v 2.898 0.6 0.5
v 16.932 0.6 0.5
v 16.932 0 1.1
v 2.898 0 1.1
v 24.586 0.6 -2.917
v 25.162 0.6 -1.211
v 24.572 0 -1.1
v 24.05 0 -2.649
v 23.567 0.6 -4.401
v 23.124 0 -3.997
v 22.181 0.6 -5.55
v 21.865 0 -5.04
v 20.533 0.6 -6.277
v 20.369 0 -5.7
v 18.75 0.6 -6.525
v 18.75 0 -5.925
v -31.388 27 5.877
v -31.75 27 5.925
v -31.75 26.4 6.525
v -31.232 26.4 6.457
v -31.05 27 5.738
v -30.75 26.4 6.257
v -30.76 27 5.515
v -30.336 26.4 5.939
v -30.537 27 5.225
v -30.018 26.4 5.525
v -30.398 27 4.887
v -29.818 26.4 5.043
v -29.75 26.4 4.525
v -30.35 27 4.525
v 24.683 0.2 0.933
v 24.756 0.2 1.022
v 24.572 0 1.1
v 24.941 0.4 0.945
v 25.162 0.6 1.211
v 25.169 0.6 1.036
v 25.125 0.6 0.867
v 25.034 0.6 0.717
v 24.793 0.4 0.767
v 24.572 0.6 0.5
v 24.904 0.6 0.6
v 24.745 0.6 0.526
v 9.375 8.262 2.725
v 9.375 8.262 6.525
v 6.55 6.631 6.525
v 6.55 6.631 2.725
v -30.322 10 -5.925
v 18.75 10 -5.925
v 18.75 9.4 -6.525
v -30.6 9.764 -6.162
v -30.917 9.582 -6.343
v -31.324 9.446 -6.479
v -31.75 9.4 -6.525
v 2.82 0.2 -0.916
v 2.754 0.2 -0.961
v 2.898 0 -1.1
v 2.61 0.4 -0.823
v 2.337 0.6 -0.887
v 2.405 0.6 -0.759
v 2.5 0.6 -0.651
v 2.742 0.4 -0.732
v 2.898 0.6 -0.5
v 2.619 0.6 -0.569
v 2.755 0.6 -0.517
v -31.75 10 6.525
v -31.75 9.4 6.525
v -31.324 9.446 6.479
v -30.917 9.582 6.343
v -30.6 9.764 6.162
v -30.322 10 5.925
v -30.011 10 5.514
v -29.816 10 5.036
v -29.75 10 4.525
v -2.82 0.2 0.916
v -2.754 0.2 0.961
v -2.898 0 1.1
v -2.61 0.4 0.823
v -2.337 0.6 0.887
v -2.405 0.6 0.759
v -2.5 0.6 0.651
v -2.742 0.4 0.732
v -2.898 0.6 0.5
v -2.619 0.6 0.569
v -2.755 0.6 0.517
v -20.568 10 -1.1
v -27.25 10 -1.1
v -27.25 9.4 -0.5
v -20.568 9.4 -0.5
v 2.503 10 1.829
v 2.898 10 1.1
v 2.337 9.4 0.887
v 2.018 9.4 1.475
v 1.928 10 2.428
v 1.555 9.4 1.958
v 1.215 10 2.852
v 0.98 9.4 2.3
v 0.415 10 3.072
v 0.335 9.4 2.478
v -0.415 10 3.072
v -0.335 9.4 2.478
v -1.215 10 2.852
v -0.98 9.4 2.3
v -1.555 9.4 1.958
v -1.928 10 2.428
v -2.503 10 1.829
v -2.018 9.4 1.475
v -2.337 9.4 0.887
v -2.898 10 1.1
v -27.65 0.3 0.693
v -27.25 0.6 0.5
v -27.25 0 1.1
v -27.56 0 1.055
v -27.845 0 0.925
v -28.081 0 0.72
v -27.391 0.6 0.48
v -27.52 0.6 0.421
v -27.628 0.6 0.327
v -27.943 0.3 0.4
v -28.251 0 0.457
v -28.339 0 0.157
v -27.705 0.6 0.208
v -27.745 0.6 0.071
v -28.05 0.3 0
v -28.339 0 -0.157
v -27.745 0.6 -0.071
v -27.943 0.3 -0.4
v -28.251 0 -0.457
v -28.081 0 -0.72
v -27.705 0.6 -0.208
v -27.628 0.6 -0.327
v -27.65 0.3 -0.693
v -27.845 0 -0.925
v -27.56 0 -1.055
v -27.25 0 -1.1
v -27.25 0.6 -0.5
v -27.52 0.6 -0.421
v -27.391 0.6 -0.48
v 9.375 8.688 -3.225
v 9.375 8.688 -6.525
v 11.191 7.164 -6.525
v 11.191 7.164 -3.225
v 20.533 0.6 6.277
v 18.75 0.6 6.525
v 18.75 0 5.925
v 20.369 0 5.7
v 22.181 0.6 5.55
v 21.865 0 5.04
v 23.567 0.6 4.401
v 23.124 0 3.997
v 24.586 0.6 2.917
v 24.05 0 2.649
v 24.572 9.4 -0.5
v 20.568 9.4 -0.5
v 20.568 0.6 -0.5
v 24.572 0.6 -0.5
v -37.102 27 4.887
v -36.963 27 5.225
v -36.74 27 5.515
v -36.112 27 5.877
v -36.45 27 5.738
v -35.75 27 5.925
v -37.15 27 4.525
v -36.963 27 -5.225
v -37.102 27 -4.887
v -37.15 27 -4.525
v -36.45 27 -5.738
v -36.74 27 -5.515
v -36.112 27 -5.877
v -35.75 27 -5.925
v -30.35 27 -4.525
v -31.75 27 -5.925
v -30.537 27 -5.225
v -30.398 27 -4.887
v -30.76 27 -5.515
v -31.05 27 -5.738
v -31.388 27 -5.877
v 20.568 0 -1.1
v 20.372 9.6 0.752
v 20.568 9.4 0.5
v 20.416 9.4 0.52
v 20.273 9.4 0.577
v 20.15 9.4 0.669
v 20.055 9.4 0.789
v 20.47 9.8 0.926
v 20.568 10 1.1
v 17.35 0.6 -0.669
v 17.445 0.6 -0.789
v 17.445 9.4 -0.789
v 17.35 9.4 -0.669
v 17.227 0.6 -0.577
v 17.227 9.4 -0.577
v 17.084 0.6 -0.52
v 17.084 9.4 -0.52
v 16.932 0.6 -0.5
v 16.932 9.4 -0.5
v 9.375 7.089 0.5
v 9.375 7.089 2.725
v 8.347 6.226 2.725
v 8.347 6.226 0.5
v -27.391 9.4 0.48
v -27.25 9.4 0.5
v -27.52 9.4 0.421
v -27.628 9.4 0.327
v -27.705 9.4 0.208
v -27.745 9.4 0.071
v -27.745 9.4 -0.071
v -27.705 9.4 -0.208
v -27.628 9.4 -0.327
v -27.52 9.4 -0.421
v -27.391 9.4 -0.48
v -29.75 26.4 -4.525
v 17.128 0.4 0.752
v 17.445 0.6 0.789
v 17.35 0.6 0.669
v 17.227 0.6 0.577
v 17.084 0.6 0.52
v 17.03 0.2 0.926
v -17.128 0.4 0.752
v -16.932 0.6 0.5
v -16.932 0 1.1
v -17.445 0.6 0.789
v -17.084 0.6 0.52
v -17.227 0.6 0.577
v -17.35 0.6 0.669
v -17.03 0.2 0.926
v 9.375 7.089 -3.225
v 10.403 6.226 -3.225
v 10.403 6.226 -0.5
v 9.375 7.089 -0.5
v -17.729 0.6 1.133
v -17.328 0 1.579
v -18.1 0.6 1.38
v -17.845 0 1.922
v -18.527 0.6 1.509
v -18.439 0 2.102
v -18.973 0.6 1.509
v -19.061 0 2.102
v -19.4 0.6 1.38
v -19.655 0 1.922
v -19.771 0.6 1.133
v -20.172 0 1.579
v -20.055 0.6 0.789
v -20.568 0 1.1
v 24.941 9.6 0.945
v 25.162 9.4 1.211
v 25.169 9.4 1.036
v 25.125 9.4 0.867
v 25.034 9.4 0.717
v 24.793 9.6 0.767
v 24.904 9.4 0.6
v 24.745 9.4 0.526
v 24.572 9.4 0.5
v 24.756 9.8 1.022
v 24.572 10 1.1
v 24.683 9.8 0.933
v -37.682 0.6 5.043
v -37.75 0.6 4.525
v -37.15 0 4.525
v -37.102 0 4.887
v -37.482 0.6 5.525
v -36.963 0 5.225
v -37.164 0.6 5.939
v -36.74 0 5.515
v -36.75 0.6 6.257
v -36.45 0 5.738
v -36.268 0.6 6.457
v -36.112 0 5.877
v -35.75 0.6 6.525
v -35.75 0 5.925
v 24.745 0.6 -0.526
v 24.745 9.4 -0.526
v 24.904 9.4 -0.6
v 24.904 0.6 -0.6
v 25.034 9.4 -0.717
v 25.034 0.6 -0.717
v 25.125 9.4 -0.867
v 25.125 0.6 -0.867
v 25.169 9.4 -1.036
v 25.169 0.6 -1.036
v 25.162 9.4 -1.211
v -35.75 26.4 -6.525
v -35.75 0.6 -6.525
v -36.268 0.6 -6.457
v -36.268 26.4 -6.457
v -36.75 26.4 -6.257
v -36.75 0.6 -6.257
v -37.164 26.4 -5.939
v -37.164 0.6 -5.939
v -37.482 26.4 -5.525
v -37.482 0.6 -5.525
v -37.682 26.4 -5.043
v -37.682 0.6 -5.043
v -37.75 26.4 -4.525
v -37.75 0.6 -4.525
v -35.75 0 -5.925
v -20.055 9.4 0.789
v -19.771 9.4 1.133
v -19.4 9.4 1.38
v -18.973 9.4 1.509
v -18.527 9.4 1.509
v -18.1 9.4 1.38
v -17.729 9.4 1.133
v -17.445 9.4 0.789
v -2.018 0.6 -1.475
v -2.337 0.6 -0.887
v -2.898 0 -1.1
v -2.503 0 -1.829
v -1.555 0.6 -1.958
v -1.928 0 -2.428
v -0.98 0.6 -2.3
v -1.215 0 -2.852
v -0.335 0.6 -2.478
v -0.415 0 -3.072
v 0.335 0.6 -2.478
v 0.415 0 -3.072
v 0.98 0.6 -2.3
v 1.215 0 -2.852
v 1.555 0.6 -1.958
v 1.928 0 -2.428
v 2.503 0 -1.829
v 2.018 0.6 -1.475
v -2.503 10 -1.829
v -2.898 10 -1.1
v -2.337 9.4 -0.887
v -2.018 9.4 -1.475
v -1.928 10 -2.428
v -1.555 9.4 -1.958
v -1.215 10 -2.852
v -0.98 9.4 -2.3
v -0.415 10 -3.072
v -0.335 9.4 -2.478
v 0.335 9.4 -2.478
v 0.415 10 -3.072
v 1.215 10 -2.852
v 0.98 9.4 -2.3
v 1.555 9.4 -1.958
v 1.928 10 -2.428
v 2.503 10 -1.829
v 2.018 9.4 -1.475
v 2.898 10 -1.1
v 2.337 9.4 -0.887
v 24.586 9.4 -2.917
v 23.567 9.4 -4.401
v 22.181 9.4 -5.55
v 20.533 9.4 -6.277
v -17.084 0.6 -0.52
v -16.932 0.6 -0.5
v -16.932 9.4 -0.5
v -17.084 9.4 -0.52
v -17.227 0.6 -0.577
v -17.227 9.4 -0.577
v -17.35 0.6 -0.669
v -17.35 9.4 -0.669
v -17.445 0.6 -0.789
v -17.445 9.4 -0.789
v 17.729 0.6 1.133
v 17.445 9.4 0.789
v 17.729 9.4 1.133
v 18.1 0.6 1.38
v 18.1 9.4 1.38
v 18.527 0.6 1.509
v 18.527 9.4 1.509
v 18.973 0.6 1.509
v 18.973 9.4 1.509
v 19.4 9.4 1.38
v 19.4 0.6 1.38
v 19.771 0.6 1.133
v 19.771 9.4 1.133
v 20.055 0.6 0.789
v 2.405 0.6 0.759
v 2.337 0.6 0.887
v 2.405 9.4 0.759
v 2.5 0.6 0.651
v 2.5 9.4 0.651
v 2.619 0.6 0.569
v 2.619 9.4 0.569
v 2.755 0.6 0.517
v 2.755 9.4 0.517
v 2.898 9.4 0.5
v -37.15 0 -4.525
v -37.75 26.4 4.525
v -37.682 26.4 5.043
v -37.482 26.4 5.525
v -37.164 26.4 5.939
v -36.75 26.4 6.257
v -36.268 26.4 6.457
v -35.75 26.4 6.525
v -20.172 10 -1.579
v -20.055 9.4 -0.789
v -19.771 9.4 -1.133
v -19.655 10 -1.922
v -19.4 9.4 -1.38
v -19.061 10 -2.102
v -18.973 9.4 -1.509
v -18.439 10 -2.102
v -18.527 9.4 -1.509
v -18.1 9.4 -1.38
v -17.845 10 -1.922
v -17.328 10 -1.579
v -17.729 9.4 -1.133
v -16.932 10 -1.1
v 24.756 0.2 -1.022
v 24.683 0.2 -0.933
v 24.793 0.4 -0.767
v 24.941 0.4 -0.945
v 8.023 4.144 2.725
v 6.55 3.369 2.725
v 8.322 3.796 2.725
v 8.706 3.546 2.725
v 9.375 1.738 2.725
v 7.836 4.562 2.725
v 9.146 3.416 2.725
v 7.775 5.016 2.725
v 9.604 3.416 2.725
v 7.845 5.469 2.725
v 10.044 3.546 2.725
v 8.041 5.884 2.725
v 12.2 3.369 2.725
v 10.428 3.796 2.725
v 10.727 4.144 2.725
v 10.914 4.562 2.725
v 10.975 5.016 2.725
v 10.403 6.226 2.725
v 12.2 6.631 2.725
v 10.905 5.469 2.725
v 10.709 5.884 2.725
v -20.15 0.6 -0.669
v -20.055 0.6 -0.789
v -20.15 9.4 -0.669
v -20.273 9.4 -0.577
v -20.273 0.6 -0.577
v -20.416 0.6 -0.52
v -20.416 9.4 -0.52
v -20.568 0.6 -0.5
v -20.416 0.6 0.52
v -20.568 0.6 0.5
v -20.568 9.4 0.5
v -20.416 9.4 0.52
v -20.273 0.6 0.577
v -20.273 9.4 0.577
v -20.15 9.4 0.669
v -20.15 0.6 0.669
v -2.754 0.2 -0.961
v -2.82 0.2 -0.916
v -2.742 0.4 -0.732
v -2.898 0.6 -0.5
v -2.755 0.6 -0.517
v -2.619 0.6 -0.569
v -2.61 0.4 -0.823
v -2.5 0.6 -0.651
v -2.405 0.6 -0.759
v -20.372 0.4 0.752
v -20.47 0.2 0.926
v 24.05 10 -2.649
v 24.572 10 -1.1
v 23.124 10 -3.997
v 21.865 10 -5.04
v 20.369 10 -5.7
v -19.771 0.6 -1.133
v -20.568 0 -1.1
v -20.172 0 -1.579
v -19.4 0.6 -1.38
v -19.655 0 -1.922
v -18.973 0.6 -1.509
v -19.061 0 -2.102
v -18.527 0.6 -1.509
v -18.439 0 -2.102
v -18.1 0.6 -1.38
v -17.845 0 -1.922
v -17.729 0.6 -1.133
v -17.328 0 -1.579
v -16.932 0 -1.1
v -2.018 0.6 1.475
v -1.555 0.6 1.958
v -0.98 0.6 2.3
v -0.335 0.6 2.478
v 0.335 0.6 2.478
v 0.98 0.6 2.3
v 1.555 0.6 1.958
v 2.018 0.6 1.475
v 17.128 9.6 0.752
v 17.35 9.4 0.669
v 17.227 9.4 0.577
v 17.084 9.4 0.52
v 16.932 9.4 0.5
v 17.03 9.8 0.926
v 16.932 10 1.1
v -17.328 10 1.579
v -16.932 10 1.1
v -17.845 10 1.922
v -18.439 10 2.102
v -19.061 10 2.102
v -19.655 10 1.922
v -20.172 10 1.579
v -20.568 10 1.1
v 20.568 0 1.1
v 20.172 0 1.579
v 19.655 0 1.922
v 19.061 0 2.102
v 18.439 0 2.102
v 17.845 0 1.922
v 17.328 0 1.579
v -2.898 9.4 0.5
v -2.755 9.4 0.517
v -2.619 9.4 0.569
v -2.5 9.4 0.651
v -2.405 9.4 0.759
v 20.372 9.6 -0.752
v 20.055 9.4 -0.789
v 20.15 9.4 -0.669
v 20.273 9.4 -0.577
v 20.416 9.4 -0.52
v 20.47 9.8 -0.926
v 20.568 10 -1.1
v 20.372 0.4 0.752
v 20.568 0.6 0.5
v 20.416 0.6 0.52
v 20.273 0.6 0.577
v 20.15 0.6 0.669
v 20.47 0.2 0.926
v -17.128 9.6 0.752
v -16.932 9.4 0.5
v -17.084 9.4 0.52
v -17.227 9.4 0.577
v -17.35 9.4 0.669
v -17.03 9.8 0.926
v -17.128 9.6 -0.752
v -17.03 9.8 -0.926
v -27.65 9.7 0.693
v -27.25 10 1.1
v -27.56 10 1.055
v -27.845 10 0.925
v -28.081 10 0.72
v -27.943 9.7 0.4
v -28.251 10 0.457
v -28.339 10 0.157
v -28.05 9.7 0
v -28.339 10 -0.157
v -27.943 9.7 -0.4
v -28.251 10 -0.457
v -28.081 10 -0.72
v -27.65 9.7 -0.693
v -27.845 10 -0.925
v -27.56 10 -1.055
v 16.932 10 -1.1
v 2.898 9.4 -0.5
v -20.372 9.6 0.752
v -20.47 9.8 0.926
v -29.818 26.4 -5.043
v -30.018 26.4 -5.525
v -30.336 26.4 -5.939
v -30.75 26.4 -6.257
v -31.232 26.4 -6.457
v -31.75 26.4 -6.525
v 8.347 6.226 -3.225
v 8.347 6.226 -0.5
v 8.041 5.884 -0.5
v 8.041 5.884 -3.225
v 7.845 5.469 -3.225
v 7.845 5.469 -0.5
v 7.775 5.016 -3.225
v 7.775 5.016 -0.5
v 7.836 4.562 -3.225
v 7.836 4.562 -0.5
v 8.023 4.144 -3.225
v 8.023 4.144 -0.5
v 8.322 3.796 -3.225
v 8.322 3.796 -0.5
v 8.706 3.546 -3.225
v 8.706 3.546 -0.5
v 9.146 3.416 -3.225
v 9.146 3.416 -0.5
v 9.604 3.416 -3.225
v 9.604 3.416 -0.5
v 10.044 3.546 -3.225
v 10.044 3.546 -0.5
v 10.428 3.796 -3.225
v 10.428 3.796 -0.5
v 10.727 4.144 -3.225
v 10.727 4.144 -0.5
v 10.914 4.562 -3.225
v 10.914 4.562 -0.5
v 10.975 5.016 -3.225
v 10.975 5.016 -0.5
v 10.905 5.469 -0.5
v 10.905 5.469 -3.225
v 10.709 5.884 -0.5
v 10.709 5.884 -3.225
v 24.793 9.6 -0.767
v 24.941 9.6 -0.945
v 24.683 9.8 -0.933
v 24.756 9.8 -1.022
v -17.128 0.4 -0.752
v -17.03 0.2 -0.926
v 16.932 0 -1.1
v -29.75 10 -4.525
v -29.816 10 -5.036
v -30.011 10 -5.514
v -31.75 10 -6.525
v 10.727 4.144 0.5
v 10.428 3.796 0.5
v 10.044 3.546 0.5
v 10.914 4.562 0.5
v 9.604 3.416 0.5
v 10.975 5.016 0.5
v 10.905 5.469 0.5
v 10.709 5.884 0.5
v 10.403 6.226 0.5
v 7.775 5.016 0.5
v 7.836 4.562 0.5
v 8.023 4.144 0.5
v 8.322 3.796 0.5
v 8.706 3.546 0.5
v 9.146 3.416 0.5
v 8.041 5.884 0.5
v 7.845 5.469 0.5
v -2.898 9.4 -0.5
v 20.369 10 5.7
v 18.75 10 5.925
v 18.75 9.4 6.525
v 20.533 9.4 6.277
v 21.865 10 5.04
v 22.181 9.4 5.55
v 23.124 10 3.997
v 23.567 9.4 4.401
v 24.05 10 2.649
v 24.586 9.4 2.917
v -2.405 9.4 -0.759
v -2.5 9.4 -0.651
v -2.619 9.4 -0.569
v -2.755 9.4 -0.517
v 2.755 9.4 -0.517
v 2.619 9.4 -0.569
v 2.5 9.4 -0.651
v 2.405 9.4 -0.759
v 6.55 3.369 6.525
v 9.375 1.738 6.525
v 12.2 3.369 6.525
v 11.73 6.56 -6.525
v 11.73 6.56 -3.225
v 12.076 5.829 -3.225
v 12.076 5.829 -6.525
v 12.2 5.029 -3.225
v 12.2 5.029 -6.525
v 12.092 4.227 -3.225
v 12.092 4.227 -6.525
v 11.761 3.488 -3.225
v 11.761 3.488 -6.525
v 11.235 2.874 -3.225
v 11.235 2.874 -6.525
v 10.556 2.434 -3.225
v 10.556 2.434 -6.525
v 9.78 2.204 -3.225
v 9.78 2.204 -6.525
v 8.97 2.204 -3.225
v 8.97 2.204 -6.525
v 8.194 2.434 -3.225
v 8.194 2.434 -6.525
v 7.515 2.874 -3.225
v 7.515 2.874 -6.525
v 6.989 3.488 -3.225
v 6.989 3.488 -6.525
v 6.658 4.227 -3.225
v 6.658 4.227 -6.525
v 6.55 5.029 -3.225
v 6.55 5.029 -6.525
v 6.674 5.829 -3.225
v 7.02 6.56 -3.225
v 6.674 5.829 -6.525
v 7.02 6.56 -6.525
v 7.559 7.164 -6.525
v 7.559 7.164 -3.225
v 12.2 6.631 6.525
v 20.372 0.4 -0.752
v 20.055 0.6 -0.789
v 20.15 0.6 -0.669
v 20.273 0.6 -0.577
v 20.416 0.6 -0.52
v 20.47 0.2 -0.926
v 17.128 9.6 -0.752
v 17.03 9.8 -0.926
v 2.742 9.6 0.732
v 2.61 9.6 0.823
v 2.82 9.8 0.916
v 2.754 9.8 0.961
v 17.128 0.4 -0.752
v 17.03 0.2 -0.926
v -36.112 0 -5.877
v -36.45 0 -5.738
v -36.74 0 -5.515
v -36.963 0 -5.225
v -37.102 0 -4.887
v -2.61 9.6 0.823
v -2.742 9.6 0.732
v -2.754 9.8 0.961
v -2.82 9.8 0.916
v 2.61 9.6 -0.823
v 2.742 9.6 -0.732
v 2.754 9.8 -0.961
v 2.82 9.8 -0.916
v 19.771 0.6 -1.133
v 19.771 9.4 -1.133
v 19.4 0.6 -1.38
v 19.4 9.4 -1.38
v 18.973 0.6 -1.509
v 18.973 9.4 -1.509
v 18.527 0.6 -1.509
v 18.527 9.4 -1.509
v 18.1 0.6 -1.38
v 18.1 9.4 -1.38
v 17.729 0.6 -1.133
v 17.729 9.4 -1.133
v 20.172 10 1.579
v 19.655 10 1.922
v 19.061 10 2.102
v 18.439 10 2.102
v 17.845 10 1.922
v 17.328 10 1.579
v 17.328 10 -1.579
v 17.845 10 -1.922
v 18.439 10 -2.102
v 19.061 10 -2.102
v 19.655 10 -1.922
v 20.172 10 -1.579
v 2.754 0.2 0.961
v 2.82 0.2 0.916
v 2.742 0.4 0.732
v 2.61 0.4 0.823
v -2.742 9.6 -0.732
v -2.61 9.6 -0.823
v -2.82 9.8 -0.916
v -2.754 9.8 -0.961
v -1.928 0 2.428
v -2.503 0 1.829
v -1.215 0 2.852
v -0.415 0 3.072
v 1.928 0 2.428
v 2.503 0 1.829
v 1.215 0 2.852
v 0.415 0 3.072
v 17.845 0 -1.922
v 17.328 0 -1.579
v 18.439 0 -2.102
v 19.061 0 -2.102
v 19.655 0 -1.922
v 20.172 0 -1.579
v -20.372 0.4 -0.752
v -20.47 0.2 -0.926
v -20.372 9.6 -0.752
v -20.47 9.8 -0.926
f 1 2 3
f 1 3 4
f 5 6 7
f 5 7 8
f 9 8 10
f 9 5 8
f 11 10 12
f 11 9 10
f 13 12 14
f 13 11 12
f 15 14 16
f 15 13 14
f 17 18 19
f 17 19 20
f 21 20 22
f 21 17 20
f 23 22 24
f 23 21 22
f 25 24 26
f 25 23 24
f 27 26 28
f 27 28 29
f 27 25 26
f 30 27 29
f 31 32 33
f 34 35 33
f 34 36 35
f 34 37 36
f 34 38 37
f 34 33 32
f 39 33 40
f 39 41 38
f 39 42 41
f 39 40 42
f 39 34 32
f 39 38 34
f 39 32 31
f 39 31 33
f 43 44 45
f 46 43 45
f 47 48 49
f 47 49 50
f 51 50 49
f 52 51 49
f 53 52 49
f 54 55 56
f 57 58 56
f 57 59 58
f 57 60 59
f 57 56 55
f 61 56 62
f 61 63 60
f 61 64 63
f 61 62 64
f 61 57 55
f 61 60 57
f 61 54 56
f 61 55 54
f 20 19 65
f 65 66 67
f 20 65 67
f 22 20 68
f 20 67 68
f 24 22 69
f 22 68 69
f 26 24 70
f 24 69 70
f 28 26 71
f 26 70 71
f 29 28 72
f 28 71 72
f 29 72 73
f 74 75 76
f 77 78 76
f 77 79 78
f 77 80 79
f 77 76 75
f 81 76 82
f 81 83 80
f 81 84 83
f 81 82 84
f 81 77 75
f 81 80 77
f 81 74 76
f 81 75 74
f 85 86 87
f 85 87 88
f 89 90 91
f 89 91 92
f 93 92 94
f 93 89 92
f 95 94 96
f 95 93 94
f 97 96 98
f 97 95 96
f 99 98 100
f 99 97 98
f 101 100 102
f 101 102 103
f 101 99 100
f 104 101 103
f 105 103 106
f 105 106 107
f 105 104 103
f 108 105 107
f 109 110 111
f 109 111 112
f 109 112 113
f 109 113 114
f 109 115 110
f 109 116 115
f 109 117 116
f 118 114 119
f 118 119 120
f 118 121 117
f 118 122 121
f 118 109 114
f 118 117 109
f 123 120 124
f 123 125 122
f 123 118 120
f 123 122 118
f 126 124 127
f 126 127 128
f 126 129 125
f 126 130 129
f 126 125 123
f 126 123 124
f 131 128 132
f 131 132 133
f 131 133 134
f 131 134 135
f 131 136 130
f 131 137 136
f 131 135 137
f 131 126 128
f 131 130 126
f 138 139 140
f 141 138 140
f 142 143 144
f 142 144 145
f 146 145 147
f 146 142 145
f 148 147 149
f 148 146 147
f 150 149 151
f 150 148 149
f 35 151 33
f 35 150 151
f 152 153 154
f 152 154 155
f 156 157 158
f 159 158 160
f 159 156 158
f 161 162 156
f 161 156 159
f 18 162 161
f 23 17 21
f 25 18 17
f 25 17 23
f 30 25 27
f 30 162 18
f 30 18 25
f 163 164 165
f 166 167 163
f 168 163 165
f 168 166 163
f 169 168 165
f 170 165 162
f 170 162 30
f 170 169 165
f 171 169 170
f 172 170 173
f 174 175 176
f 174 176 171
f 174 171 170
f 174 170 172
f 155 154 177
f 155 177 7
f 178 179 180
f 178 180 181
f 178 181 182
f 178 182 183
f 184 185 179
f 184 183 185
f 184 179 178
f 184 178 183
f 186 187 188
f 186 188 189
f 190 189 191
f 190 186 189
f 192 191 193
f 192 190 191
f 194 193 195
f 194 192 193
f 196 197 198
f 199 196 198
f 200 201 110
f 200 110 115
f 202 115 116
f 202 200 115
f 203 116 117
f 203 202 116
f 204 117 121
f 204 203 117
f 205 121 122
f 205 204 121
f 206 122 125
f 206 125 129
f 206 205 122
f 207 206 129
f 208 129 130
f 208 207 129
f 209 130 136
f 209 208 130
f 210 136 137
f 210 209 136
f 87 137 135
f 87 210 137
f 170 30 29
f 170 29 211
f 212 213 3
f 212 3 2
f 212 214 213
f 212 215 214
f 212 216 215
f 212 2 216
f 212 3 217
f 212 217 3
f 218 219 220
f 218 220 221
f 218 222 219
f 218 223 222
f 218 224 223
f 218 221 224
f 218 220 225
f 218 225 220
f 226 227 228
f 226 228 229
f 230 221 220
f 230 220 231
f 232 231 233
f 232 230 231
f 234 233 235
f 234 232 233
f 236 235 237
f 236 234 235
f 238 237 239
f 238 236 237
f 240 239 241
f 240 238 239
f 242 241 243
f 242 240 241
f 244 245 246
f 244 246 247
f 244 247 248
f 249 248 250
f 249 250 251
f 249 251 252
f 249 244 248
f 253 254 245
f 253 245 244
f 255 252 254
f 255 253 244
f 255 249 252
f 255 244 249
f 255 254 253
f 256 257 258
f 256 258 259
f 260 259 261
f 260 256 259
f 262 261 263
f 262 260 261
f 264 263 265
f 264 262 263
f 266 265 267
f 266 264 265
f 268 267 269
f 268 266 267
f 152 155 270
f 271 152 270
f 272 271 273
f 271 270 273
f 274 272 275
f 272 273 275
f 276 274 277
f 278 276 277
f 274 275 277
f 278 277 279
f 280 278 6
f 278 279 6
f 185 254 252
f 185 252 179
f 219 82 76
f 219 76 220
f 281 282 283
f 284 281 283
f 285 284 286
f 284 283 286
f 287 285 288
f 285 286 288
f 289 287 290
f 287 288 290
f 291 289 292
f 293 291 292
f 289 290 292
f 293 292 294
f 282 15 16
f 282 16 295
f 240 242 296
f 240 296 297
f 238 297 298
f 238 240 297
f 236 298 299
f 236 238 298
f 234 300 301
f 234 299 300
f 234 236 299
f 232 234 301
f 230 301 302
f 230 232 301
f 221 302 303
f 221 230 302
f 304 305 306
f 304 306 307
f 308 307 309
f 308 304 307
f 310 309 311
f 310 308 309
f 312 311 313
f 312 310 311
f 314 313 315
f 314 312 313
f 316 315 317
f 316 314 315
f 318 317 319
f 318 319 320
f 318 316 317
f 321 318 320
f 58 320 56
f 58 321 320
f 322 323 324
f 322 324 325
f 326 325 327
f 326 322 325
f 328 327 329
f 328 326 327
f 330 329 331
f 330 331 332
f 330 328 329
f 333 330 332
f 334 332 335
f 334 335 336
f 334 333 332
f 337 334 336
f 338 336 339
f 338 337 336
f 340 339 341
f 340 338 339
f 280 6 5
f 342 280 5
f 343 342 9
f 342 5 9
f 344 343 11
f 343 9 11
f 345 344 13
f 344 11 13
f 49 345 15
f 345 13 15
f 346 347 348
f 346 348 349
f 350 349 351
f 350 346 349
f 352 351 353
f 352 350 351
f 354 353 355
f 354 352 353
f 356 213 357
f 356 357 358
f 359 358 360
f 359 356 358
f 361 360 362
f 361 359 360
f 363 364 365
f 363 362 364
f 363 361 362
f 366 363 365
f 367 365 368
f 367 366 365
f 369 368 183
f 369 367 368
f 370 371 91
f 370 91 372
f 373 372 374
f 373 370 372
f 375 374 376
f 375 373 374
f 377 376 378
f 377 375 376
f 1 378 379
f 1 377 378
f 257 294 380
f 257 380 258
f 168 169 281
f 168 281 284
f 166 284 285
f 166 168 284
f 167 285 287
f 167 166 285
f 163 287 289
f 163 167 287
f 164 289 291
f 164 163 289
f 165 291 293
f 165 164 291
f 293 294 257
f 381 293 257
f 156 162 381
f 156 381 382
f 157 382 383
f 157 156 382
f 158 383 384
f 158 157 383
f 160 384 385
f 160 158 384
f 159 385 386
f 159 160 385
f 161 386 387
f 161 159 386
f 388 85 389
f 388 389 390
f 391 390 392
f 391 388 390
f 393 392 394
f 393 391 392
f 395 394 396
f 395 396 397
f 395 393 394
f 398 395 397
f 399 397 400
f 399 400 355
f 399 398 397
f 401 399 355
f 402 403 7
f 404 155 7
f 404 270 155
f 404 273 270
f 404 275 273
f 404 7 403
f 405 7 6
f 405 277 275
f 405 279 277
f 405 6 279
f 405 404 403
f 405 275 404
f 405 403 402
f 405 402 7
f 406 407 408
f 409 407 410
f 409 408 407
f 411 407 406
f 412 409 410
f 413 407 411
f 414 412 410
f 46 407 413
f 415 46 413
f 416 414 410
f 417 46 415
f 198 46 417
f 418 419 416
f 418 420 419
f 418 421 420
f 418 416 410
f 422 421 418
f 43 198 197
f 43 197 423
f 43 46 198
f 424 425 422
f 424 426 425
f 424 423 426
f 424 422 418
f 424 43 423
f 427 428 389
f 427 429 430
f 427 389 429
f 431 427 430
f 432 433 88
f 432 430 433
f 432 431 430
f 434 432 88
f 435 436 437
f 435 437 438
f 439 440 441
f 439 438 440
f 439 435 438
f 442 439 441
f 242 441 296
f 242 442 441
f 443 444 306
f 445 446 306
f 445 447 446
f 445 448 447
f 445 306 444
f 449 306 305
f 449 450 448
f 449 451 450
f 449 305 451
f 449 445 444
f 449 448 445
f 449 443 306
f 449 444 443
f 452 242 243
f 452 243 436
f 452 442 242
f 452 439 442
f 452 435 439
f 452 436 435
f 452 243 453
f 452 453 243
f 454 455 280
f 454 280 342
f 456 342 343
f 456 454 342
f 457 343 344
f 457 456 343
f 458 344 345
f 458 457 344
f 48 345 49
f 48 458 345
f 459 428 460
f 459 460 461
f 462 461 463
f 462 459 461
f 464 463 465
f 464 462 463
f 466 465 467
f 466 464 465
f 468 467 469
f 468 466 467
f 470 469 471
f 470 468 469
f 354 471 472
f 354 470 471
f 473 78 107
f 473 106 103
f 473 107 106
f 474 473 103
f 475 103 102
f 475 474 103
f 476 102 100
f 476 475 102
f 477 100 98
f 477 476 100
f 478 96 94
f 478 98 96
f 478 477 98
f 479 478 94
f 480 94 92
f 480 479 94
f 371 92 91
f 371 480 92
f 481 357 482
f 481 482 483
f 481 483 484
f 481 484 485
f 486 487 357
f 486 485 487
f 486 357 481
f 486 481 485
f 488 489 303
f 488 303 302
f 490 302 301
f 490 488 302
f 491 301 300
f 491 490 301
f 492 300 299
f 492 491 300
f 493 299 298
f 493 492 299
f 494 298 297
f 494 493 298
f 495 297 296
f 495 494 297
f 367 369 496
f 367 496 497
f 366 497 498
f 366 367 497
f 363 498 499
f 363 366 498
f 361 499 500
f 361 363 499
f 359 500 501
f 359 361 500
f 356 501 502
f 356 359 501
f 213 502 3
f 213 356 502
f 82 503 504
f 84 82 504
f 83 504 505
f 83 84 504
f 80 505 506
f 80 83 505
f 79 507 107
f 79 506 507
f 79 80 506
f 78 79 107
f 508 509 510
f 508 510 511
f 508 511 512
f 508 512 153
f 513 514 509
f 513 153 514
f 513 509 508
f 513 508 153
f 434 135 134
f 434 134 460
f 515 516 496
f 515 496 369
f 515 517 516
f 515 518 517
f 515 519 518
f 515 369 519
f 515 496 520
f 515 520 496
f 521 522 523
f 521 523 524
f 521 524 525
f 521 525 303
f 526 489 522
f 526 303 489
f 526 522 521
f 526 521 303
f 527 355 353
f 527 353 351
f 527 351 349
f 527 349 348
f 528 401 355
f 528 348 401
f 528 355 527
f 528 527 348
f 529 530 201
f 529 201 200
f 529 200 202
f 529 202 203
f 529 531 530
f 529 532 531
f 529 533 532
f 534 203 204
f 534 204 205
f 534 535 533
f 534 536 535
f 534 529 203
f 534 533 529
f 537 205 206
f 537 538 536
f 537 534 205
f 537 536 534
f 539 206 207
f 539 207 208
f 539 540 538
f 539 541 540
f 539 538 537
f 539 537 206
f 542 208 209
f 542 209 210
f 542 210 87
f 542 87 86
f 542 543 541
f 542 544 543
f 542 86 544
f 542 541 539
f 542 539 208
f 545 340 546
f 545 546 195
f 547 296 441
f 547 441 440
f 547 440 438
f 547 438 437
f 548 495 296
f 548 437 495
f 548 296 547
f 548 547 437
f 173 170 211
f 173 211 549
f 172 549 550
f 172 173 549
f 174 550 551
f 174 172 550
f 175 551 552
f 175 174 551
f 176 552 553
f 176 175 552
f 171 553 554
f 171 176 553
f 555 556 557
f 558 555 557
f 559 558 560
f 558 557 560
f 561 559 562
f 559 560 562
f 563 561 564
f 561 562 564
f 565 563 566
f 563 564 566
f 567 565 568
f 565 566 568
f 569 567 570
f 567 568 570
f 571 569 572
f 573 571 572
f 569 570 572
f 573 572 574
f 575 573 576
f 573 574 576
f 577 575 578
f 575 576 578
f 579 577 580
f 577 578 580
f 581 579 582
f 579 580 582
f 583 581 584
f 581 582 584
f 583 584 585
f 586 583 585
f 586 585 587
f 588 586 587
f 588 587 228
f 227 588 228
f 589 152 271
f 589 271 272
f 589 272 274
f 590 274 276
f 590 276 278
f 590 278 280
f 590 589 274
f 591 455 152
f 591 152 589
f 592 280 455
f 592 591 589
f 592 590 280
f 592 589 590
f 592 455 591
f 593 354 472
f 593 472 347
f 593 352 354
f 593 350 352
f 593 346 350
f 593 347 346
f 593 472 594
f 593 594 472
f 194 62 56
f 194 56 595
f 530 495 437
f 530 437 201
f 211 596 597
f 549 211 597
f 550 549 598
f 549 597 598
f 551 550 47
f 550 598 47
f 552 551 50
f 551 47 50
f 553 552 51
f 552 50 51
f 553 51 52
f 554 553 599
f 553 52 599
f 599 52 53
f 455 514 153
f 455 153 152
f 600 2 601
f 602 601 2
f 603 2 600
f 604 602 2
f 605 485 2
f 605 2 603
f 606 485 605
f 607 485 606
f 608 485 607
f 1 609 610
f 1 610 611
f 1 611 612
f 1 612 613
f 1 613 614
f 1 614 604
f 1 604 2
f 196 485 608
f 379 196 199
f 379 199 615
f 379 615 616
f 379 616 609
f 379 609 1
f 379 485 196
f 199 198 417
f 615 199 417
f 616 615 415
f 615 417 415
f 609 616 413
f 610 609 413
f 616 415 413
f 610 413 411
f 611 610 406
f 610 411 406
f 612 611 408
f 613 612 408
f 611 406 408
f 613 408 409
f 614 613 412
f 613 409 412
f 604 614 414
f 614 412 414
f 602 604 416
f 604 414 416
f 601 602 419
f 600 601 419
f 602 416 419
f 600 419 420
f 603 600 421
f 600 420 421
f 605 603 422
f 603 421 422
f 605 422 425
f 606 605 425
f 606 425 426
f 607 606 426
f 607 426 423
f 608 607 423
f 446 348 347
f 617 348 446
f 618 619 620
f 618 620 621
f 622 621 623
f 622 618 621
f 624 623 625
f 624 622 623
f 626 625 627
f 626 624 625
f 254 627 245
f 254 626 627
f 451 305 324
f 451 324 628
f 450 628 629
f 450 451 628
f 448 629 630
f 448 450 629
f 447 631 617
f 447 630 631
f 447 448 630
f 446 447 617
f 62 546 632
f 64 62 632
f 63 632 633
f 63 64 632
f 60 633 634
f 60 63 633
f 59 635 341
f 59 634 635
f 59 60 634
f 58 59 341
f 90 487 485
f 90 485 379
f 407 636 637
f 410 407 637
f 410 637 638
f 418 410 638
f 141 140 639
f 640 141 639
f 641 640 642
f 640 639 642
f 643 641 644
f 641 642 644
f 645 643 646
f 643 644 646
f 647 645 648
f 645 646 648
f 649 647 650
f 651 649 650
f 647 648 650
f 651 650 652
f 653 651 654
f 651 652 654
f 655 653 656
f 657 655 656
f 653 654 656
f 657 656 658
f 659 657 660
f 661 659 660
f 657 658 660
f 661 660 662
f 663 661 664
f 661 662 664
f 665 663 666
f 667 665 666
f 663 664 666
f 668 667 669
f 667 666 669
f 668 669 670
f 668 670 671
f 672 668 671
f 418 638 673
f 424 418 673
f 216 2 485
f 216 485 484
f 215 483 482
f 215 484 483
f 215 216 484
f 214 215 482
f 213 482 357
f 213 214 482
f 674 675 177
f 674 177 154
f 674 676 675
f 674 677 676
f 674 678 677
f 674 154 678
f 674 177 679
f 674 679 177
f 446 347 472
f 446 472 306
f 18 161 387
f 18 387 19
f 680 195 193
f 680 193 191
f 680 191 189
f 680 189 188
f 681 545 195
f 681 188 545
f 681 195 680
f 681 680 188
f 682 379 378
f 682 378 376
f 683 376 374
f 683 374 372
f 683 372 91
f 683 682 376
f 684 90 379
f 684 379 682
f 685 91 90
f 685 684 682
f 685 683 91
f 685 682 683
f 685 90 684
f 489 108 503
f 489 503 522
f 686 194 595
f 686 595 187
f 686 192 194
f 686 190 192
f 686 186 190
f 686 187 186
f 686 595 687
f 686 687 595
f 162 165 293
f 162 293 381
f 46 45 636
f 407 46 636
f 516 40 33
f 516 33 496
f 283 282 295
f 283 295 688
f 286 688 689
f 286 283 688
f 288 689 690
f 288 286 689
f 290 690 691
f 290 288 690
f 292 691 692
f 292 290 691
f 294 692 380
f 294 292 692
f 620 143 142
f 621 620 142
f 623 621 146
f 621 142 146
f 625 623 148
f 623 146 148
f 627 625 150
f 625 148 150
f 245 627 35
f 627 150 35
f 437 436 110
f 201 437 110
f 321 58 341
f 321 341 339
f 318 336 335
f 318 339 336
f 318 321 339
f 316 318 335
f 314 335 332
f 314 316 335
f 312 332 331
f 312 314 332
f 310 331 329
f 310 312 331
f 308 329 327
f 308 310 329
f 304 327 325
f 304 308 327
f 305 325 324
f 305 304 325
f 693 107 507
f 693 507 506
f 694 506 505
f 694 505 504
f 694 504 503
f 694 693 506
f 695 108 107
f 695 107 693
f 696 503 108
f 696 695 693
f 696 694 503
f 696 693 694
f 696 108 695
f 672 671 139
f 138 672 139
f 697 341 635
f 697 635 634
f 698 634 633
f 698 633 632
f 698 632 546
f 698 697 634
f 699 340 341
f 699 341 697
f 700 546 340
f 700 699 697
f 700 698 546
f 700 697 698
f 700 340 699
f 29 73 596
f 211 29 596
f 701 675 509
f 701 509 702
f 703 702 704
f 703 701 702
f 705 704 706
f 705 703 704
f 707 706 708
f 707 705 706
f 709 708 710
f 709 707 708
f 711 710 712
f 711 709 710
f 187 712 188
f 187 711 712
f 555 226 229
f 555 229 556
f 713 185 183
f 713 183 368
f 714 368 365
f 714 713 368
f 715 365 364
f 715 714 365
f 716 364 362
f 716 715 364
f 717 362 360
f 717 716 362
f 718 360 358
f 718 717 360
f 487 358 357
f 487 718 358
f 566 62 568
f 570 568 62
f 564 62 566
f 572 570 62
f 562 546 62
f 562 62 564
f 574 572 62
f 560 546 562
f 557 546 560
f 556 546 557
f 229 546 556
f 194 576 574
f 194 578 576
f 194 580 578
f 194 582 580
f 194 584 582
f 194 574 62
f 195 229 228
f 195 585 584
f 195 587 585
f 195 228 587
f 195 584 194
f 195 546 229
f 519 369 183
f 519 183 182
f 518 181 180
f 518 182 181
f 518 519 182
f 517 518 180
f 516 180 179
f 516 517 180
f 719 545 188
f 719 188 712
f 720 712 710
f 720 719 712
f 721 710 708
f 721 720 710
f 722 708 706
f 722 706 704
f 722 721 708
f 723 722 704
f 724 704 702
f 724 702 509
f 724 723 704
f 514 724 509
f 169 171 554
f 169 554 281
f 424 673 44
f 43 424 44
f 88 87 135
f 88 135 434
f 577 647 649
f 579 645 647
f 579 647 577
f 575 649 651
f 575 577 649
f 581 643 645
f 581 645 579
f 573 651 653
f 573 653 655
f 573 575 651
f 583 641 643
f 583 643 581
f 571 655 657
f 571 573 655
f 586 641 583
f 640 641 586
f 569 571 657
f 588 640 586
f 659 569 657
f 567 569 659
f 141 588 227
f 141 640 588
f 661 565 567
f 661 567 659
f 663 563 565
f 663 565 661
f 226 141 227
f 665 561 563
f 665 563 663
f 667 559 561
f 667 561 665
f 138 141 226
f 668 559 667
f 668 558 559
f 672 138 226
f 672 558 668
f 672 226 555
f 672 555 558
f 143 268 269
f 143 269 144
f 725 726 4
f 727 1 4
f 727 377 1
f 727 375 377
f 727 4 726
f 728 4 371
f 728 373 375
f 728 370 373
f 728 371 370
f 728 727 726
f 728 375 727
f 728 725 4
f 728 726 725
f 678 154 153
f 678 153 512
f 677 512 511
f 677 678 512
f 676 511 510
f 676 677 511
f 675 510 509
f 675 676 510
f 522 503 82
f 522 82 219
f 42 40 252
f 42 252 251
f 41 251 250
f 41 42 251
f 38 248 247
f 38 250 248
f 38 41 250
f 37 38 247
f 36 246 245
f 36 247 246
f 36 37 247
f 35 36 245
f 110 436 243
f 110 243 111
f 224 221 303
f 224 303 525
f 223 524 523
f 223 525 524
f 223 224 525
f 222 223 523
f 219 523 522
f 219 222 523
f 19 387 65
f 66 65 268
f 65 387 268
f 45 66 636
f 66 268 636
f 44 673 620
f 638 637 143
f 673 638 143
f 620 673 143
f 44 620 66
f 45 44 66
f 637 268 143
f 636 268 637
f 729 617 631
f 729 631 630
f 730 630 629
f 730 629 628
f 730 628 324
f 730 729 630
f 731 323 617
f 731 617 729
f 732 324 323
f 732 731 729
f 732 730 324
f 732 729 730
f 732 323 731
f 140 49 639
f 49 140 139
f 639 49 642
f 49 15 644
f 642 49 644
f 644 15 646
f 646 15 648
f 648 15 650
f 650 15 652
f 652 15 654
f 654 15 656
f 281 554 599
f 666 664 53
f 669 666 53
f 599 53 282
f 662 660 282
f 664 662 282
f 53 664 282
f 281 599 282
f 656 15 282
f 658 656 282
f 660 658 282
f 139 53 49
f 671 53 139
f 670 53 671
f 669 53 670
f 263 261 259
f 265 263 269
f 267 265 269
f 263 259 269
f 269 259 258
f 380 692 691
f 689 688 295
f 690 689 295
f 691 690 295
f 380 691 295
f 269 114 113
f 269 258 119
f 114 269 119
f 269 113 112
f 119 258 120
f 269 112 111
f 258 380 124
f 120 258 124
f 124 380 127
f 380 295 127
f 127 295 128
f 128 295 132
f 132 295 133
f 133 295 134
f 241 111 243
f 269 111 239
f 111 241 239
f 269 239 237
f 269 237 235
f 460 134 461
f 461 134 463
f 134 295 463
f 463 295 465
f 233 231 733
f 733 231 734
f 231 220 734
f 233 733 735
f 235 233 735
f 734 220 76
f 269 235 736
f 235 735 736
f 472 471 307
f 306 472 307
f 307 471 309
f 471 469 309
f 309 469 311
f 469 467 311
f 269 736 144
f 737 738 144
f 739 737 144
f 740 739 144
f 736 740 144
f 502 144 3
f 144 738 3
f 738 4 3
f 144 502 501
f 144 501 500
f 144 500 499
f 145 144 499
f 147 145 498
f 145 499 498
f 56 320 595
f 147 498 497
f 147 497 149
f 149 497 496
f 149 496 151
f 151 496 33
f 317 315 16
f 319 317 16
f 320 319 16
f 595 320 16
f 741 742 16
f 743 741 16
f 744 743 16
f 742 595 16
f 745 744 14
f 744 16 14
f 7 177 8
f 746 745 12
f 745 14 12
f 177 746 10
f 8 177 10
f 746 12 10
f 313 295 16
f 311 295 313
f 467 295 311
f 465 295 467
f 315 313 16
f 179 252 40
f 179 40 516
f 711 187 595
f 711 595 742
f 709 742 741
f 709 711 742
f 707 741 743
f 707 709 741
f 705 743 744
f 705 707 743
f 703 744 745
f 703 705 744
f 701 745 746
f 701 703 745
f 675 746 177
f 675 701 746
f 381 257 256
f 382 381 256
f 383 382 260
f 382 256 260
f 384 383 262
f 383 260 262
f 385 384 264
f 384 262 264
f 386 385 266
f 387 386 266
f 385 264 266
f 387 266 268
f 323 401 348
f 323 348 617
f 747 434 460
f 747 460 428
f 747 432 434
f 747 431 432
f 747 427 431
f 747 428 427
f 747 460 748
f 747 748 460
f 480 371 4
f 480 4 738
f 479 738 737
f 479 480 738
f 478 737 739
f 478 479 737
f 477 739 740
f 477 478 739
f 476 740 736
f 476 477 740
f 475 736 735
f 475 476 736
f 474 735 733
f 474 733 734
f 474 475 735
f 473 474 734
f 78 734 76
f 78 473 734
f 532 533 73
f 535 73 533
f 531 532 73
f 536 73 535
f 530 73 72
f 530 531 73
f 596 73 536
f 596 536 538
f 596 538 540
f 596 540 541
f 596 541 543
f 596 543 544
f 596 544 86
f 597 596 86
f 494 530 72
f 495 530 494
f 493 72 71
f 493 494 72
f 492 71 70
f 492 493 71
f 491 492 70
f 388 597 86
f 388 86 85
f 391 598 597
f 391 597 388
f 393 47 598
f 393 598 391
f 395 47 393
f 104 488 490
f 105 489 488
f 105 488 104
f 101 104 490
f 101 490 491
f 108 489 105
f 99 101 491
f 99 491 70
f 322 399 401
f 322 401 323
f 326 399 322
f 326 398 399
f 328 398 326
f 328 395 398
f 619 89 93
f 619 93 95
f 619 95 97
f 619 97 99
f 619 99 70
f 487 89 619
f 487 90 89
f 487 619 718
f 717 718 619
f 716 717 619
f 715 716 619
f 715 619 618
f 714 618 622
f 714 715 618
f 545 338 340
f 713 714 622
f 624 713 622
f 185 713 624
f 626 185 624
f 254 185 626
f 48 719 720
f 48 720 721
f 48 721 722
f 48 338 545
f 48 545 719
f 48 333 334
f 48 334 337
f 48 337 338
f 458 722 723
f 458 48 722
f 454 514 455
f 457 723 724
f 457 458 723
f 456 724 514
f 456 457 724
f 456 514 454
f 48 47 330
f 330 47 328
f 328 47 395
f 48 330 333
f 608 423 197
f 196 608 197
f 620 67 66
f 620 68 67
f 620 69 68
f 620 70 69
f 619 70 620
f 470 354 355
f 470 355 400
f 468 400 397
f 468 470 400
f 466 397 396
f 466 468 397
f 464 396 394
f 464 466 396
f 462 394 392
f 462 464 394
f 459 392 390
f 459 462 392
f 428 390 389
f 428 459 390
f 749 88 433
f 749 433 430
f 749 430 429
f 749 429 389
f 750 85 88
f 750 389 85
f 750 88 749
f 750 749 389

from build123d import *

# Parameters (mm, degrees)
SKETCH1_R               = 1.525
SKETCH1_R_2             = 2.5
SKETCH1_R_3             = 1.5
MAIN_BODY_DEPTH         = 10
SKETCH1_4_R             = 2.5
LEAD_SCREW_CUTOUT_DEPTH = 40.593410121
LIMIT_SWITCH_TAB_DEPTH  = 17
CUT_EXTRUDE1_DEPTH      = 42.912266999
FILLET1_R               = 0.6
CHAMFER1_SIZE           = 0.6
CUT_EXTRUDE2_DEPTH      = 3.8
CUT_EXTRUDE3_DEPTH      = 49.211668712
CUT_EXTRUDE4_DEPTH      = 3.3


with BuildPart() as part:
    # Sketch1 → Main body (new body)
    # profile 1 of 3: a face of its own
    with BuildSketch(Plane(origin=(0, 0, 0), x_dir=(1, 0, 0), z_dir=(0, 1, 0))):
        with BuildLine():
            Line((18.75, 6.525), (-18.75, 6.525))
            Line((-18.75, 6.525), (-35.75, 6.525))
            ThreePointArc((-35.75, 6.525), (-37.164213562, 5.939213562), (-37.75, 4.525))
            Line((-37.75, 4.525), (-37.75, -4.525))
            ThreePointArc((-37.75, -4.525), (-37.164213562, -5.939213562), (-35.75, -6.525))
            Line((-35.75, -6.525), (-18.75, -6.525))
            Line((-18.75, -6.525), (18.75, -6.525))
            ThreePointArc((18.75, -6.525), (25.275, 0), (18.75, 6.525))
        make_face()
        with Locations(Location((-18.75, 0, 0), (0, 0, 270))):
            Circle(SKETCH1_R, mode=Mode.SUBTRACT)
        Circle(SKETCH1_R_2, mode=Mode.SUBTRACT)
        with Locations(Location((18.75, 0, 0), (0, 0, 270))):
            Circle(SKETCH1_R, mode=Mode.SUBTRACT)
    # profile 2 of 3: a face of its own
    with BuildSketch(Plane(origin=(0, 0, 0), x_dir=(1, 0, 0), z_dir=(0, 1, 0))):
        Circle(SKETCH1_R_2)
        Circle(SKETCH1_R_3, mode=Mode.SUBTRACT)
    # profile 3 of 3: a face of its own
    with BuildSketch(Plane(origin=(0, 0, 0), x_dir=(1, 0, 0), z_dir=(0, 1, 0))):
        Circle(SKETCH1_R_3)
    extrude(amount=MAIN_BODY_DEPTH)

    # Sketch1<4> → Lead screw cutout (cut, through all)
    with BuildSketch(Plane(origin=(0, 0, 0), x_dir=(1, 0, 0), z_dir=(0, 1, 0))):
        with Locations(Location((0, 0, 0), (0, 0, 270))):
            Circle(SKETCH1_4_R)
    extrude(amount=LEAD_SCREW_CUTOUT_DEPTH, mode=Mode.SUBTRACT)

    # Limit switch tab sketch → Limit switch tab (add)
    with BuildSketch(Plane(origin=(0, 10, 0), x_dir=(1, 0, 0), z_dir=(0, 1, 0))):
        with BuildLine():
            Line((-37.75, 4.525), (-37.75, -4.525))
            ThreePointArc((-37.75, -4.525), (-37.164213562, -5.939213562), (-35.75, -6.525))
            Line((-35.75, -6.525), (-31.75, -6.525))
            ThreePointArc((-31.75, -6.525), (-30.335786438, -5.939213562), (-29.75, -4.525))
            Line((-29.75, -4.525), (-29.75, 4.525))
            ThreePointArc((-29.75, 4.525), (-30.335786438, 5.939213562), (-31.75, 6.525))
            Line((-31.75, 6.525), (-35.75, 6.525))
            ThreePointArc((-35.75, 6.525), (-37.164213562, 5.939213562), (-37.75, 4.525))
        make_face()
    extrude(amount=LIMIT_SWITCH_TAB_DEPTH)

    # Sketch2 → Cut-Extrude1 (cut, through all)
    with BuildSketch(Plane(origin=(0, 10, 0), x_dir=(1, 0, 0), z_dir=(0, 1, 0))):
        with BuildLine():
            Line((-27.25, 0.5), (27.993605311, 0.5))
            Line((27.993605311, 0.5), (27.993605311, -0.5))
            Line((27.993605311, -0.5), (-27.25, -0.5))
            ThreePointArc((-27.25, -0.5), (-27.75, 0), (-27.25, 0.5))
        make_face()
    extrude(amount=-CUT_EXTRUDE1_DEPTH, mode=Mode.SUBTRACT)

    # Fillet1
    fillet1_edges = [part.edges().sort_by_distance(p)[0] for p in [
        (2.449489743, 5, 0.5),
        (-2.449489743, 5, 0.5),
        (-2.449489743, 5, -0.5),
        (2.449489743, 5, -0.5),
        (-17.309297047, 5, -0.5),
        (-20.190702953, 5, -0.5),
        (20.190702953, 5, -0.5),
        (17.309297047, 5, -0.5),
        (25.255814707, 5, -0.5),
        (-20.190702953, 5, 0.5),
        (-17.309297047, 5, 0.5),
        (17.309297047, 5, 0.5),
        (20.190702953, 5, 0.5),
        (25.255814707, 5, 0.5),
    ]]
    fillet(fillet1_edges, radius=FILLET1_R)

    # Chamfer1
    chamfer1_edges = [part.edges().sort_by_distance(p)[0] for p in [
        (22.913609585, 0, -5.023940706),
        (-8.5, 0, 6.525),
        (-37.164213562, 0, 5.939213562),
        (-37.75, 0, 0),
        (9.915068783, 10, -0.5),
        (9.915068783, 0, -0.5),
        (22.570066358, 0, -0.5),
        (-37.164213562, 0, -5.939213562),
        (18.75, 0, -1.525),
        (0, 0, -2.5),
        (-9.915068783, 0, -0.5),
        (-18.75, 0, -1.525),
        (-23.909068892, 0, -0.5),
        (-18.75, 0, 1.525),
        (-9.915068783, 0, 0.5),
        (0, 0, 2.5),
        (-8.5, 0, -6.525),
        (9.915068783, 0, 0.5),
        (18.75, 0, 1.525),
        (22.570066358, 0, 0.5),
        (22.913609585, 0, 5.023940706),
        (-20.273479457, 0, -0.577337135),
        (-17.226520543, 0, -0.577337135),
        (-20.273479457, 0, 0.577337135),
        (-17.226520543, 0, 0.577337135),
        (-2.557498249, 0, 0.606167065),
        (-2.557498249, 0, -0.606167065),
        (2.557498249, 0, 0.606167065),
        (17.226520543, 0, -0.577337135),
        (17.226520543, 0, 0.577337135),
        (20.273479457, 0, 0.577337135),
        (20.273479457, 0, -0.577337135),
        (25.033966492, 0, -0.717139348),
        (25.033966492, 0, 0.717139348),
        (2.557498249, 0, -0.606167065),
        (0, 10, -2.5),
        (22.570066358, 10, -0.5),
        (22.913609585, 10, 5.023940706),
        (22.570066358, 10, 0.5),
        (18.75, 10, 1.525),
        (9.915068783, 10, 0.5),
        (0, 10, 2.5),
        (-9.915068783, 10, 0.5),
        (-18.75, 10, 1.525),
        (-23.909068892, 10, -0.5),
        (-18.75, 10, -1.525),
        (-9.915068783, 10, -0.5),
        (18.75, 10, -1.525),
        (-20.273479457, 10, -0.577337135),
        (-17.226520543, 10, -0.577337135),
        (-20.273479457, 10, 0.577337135),
        (-17.226520543, 10, 0.577337135),
        (-2.557498249, 10, 0.606167065),
        (-2.557498249, 10, -0.606167065),
        (2.557498249, 10, 0.606167065),
        (17.226520543, 10, -0.577337135),
        (17.226520543, 10, 0.577337135),
        (20.273479457, 10, 0.577337135),
        (20.273479457, 10, -0.577337135),
        (25.033966492, 10, -0.717139348),
        (25.033966492, 10, 0.717139348),
        (2.557498249, 10, -0.606167065),
        (-6.5, 10, -6.525),
        (-6.5, 10, 6.525),
        (-37.164213562, 27, 5.939213562),
        (-33.75, 27, 6.525),
        (-30.335786438, 27, 5.939213562),
        (-29.75, 27, 0),
        (-30.335786438, 27, -5.939213562),
        (-33.75, 27, -6.525),
        (-37.164213562, 27, -5.939213562),
        (-37.75, 27, 0),
        (22.913609585, 10, -5.023940706),
        (-23.909068892, 0, 0.5),
        (-27.75, 0, 0),
        (-27.75, 10, 0),
        (-23.909068892, 10, 0.5),
    ]]
    chamfer(chamfer1_edges, length=CHAMFER1_SIZE - 0.0001)  # a hair under: the kernel refuses the full size

    # Sketch3 → Cut-Extrude2 (cut)
    # profile 1 of 2: a face of its own
    with BuildSketch(Plane.XY.offset(6.525)):
        Polygon((12.2, 3.36898549), (12.2, 6.63101451), (9.375, 8.262029021), (6.55, 6.63101451), (6.55, 3.36898549), (9.375, 1.737970979), align=None)
        with BuildLine():
            ThreePointArc((8.346539825, 6.225671109), (9.375, 3.4), (10.403460175, 6.225671109))
            Line((10.403460175, 6.225671109), (9.375, 7.088651663))
            Line((9.375, 7.088651663), (8.346539825, 6.225671109))
        make_face(mode=Mode.SUBTRACT)
    # profile 2 of 2: a face of its own
    with BuildSketch(Plane.XY.offset(6.525)):
        with BuildLine():
            Line((9.375, 7.088651663), (8.346539825, 6.225671109))
            ThreePointArc((8.346539825, 6.225671109), (9.375, 3.4), (10.403460175, 6.225671109))
            Line((10.403460175, 6.225671109), (9.375, 7.088651663))
        make_face()
    extrude(amount=-CUT_EXTRUDE2_DEPTH, mode=Mode.SUBTRACT)

    # Sketch3<3> → Cut-Extrude3 (cut, through all)
    with BuildSketch(Plane.XY.offset(6.525)):
        with BuildLine():
            Line((9.375, 7.088651663), (8.346539825, 6.225671109))
            ThreePointArc((8.346539825, 6.225671109), (9.375, 3.4), (10.403460175, 6.225671109))
            Line((10.403460175, 6.225671109), (9.375, 7.088651663))
        make_face()
    extrude(amount=-CUT_EXTRUDE3_DEPTH, mode=Mode.SUBTRACT)

    # Sketch4 → Cut-Extrude4 (cut)
    with BuildSketch(Plane(origin=(0, 0, -6.525), x_dir=(-1, 0, 0), z_dir=(0, 0, -1))):
        with BuildLine():
            Line((-9.375, 8.687775592), (-11.190874997, 7.164075552))
            ThreePointArc((-11.190874997, 7.164075552), (-9.375, 2.175), (-7.559125003, 7.164075552))
            Line((-7.559125003, 7.164075552), (-9.375, 8.687775592))
        make_face()
    extrude(amount=-CUT_EXTRUDE4_DEPTH, mode=Mode.SUBTRACT)


solid = part.part
